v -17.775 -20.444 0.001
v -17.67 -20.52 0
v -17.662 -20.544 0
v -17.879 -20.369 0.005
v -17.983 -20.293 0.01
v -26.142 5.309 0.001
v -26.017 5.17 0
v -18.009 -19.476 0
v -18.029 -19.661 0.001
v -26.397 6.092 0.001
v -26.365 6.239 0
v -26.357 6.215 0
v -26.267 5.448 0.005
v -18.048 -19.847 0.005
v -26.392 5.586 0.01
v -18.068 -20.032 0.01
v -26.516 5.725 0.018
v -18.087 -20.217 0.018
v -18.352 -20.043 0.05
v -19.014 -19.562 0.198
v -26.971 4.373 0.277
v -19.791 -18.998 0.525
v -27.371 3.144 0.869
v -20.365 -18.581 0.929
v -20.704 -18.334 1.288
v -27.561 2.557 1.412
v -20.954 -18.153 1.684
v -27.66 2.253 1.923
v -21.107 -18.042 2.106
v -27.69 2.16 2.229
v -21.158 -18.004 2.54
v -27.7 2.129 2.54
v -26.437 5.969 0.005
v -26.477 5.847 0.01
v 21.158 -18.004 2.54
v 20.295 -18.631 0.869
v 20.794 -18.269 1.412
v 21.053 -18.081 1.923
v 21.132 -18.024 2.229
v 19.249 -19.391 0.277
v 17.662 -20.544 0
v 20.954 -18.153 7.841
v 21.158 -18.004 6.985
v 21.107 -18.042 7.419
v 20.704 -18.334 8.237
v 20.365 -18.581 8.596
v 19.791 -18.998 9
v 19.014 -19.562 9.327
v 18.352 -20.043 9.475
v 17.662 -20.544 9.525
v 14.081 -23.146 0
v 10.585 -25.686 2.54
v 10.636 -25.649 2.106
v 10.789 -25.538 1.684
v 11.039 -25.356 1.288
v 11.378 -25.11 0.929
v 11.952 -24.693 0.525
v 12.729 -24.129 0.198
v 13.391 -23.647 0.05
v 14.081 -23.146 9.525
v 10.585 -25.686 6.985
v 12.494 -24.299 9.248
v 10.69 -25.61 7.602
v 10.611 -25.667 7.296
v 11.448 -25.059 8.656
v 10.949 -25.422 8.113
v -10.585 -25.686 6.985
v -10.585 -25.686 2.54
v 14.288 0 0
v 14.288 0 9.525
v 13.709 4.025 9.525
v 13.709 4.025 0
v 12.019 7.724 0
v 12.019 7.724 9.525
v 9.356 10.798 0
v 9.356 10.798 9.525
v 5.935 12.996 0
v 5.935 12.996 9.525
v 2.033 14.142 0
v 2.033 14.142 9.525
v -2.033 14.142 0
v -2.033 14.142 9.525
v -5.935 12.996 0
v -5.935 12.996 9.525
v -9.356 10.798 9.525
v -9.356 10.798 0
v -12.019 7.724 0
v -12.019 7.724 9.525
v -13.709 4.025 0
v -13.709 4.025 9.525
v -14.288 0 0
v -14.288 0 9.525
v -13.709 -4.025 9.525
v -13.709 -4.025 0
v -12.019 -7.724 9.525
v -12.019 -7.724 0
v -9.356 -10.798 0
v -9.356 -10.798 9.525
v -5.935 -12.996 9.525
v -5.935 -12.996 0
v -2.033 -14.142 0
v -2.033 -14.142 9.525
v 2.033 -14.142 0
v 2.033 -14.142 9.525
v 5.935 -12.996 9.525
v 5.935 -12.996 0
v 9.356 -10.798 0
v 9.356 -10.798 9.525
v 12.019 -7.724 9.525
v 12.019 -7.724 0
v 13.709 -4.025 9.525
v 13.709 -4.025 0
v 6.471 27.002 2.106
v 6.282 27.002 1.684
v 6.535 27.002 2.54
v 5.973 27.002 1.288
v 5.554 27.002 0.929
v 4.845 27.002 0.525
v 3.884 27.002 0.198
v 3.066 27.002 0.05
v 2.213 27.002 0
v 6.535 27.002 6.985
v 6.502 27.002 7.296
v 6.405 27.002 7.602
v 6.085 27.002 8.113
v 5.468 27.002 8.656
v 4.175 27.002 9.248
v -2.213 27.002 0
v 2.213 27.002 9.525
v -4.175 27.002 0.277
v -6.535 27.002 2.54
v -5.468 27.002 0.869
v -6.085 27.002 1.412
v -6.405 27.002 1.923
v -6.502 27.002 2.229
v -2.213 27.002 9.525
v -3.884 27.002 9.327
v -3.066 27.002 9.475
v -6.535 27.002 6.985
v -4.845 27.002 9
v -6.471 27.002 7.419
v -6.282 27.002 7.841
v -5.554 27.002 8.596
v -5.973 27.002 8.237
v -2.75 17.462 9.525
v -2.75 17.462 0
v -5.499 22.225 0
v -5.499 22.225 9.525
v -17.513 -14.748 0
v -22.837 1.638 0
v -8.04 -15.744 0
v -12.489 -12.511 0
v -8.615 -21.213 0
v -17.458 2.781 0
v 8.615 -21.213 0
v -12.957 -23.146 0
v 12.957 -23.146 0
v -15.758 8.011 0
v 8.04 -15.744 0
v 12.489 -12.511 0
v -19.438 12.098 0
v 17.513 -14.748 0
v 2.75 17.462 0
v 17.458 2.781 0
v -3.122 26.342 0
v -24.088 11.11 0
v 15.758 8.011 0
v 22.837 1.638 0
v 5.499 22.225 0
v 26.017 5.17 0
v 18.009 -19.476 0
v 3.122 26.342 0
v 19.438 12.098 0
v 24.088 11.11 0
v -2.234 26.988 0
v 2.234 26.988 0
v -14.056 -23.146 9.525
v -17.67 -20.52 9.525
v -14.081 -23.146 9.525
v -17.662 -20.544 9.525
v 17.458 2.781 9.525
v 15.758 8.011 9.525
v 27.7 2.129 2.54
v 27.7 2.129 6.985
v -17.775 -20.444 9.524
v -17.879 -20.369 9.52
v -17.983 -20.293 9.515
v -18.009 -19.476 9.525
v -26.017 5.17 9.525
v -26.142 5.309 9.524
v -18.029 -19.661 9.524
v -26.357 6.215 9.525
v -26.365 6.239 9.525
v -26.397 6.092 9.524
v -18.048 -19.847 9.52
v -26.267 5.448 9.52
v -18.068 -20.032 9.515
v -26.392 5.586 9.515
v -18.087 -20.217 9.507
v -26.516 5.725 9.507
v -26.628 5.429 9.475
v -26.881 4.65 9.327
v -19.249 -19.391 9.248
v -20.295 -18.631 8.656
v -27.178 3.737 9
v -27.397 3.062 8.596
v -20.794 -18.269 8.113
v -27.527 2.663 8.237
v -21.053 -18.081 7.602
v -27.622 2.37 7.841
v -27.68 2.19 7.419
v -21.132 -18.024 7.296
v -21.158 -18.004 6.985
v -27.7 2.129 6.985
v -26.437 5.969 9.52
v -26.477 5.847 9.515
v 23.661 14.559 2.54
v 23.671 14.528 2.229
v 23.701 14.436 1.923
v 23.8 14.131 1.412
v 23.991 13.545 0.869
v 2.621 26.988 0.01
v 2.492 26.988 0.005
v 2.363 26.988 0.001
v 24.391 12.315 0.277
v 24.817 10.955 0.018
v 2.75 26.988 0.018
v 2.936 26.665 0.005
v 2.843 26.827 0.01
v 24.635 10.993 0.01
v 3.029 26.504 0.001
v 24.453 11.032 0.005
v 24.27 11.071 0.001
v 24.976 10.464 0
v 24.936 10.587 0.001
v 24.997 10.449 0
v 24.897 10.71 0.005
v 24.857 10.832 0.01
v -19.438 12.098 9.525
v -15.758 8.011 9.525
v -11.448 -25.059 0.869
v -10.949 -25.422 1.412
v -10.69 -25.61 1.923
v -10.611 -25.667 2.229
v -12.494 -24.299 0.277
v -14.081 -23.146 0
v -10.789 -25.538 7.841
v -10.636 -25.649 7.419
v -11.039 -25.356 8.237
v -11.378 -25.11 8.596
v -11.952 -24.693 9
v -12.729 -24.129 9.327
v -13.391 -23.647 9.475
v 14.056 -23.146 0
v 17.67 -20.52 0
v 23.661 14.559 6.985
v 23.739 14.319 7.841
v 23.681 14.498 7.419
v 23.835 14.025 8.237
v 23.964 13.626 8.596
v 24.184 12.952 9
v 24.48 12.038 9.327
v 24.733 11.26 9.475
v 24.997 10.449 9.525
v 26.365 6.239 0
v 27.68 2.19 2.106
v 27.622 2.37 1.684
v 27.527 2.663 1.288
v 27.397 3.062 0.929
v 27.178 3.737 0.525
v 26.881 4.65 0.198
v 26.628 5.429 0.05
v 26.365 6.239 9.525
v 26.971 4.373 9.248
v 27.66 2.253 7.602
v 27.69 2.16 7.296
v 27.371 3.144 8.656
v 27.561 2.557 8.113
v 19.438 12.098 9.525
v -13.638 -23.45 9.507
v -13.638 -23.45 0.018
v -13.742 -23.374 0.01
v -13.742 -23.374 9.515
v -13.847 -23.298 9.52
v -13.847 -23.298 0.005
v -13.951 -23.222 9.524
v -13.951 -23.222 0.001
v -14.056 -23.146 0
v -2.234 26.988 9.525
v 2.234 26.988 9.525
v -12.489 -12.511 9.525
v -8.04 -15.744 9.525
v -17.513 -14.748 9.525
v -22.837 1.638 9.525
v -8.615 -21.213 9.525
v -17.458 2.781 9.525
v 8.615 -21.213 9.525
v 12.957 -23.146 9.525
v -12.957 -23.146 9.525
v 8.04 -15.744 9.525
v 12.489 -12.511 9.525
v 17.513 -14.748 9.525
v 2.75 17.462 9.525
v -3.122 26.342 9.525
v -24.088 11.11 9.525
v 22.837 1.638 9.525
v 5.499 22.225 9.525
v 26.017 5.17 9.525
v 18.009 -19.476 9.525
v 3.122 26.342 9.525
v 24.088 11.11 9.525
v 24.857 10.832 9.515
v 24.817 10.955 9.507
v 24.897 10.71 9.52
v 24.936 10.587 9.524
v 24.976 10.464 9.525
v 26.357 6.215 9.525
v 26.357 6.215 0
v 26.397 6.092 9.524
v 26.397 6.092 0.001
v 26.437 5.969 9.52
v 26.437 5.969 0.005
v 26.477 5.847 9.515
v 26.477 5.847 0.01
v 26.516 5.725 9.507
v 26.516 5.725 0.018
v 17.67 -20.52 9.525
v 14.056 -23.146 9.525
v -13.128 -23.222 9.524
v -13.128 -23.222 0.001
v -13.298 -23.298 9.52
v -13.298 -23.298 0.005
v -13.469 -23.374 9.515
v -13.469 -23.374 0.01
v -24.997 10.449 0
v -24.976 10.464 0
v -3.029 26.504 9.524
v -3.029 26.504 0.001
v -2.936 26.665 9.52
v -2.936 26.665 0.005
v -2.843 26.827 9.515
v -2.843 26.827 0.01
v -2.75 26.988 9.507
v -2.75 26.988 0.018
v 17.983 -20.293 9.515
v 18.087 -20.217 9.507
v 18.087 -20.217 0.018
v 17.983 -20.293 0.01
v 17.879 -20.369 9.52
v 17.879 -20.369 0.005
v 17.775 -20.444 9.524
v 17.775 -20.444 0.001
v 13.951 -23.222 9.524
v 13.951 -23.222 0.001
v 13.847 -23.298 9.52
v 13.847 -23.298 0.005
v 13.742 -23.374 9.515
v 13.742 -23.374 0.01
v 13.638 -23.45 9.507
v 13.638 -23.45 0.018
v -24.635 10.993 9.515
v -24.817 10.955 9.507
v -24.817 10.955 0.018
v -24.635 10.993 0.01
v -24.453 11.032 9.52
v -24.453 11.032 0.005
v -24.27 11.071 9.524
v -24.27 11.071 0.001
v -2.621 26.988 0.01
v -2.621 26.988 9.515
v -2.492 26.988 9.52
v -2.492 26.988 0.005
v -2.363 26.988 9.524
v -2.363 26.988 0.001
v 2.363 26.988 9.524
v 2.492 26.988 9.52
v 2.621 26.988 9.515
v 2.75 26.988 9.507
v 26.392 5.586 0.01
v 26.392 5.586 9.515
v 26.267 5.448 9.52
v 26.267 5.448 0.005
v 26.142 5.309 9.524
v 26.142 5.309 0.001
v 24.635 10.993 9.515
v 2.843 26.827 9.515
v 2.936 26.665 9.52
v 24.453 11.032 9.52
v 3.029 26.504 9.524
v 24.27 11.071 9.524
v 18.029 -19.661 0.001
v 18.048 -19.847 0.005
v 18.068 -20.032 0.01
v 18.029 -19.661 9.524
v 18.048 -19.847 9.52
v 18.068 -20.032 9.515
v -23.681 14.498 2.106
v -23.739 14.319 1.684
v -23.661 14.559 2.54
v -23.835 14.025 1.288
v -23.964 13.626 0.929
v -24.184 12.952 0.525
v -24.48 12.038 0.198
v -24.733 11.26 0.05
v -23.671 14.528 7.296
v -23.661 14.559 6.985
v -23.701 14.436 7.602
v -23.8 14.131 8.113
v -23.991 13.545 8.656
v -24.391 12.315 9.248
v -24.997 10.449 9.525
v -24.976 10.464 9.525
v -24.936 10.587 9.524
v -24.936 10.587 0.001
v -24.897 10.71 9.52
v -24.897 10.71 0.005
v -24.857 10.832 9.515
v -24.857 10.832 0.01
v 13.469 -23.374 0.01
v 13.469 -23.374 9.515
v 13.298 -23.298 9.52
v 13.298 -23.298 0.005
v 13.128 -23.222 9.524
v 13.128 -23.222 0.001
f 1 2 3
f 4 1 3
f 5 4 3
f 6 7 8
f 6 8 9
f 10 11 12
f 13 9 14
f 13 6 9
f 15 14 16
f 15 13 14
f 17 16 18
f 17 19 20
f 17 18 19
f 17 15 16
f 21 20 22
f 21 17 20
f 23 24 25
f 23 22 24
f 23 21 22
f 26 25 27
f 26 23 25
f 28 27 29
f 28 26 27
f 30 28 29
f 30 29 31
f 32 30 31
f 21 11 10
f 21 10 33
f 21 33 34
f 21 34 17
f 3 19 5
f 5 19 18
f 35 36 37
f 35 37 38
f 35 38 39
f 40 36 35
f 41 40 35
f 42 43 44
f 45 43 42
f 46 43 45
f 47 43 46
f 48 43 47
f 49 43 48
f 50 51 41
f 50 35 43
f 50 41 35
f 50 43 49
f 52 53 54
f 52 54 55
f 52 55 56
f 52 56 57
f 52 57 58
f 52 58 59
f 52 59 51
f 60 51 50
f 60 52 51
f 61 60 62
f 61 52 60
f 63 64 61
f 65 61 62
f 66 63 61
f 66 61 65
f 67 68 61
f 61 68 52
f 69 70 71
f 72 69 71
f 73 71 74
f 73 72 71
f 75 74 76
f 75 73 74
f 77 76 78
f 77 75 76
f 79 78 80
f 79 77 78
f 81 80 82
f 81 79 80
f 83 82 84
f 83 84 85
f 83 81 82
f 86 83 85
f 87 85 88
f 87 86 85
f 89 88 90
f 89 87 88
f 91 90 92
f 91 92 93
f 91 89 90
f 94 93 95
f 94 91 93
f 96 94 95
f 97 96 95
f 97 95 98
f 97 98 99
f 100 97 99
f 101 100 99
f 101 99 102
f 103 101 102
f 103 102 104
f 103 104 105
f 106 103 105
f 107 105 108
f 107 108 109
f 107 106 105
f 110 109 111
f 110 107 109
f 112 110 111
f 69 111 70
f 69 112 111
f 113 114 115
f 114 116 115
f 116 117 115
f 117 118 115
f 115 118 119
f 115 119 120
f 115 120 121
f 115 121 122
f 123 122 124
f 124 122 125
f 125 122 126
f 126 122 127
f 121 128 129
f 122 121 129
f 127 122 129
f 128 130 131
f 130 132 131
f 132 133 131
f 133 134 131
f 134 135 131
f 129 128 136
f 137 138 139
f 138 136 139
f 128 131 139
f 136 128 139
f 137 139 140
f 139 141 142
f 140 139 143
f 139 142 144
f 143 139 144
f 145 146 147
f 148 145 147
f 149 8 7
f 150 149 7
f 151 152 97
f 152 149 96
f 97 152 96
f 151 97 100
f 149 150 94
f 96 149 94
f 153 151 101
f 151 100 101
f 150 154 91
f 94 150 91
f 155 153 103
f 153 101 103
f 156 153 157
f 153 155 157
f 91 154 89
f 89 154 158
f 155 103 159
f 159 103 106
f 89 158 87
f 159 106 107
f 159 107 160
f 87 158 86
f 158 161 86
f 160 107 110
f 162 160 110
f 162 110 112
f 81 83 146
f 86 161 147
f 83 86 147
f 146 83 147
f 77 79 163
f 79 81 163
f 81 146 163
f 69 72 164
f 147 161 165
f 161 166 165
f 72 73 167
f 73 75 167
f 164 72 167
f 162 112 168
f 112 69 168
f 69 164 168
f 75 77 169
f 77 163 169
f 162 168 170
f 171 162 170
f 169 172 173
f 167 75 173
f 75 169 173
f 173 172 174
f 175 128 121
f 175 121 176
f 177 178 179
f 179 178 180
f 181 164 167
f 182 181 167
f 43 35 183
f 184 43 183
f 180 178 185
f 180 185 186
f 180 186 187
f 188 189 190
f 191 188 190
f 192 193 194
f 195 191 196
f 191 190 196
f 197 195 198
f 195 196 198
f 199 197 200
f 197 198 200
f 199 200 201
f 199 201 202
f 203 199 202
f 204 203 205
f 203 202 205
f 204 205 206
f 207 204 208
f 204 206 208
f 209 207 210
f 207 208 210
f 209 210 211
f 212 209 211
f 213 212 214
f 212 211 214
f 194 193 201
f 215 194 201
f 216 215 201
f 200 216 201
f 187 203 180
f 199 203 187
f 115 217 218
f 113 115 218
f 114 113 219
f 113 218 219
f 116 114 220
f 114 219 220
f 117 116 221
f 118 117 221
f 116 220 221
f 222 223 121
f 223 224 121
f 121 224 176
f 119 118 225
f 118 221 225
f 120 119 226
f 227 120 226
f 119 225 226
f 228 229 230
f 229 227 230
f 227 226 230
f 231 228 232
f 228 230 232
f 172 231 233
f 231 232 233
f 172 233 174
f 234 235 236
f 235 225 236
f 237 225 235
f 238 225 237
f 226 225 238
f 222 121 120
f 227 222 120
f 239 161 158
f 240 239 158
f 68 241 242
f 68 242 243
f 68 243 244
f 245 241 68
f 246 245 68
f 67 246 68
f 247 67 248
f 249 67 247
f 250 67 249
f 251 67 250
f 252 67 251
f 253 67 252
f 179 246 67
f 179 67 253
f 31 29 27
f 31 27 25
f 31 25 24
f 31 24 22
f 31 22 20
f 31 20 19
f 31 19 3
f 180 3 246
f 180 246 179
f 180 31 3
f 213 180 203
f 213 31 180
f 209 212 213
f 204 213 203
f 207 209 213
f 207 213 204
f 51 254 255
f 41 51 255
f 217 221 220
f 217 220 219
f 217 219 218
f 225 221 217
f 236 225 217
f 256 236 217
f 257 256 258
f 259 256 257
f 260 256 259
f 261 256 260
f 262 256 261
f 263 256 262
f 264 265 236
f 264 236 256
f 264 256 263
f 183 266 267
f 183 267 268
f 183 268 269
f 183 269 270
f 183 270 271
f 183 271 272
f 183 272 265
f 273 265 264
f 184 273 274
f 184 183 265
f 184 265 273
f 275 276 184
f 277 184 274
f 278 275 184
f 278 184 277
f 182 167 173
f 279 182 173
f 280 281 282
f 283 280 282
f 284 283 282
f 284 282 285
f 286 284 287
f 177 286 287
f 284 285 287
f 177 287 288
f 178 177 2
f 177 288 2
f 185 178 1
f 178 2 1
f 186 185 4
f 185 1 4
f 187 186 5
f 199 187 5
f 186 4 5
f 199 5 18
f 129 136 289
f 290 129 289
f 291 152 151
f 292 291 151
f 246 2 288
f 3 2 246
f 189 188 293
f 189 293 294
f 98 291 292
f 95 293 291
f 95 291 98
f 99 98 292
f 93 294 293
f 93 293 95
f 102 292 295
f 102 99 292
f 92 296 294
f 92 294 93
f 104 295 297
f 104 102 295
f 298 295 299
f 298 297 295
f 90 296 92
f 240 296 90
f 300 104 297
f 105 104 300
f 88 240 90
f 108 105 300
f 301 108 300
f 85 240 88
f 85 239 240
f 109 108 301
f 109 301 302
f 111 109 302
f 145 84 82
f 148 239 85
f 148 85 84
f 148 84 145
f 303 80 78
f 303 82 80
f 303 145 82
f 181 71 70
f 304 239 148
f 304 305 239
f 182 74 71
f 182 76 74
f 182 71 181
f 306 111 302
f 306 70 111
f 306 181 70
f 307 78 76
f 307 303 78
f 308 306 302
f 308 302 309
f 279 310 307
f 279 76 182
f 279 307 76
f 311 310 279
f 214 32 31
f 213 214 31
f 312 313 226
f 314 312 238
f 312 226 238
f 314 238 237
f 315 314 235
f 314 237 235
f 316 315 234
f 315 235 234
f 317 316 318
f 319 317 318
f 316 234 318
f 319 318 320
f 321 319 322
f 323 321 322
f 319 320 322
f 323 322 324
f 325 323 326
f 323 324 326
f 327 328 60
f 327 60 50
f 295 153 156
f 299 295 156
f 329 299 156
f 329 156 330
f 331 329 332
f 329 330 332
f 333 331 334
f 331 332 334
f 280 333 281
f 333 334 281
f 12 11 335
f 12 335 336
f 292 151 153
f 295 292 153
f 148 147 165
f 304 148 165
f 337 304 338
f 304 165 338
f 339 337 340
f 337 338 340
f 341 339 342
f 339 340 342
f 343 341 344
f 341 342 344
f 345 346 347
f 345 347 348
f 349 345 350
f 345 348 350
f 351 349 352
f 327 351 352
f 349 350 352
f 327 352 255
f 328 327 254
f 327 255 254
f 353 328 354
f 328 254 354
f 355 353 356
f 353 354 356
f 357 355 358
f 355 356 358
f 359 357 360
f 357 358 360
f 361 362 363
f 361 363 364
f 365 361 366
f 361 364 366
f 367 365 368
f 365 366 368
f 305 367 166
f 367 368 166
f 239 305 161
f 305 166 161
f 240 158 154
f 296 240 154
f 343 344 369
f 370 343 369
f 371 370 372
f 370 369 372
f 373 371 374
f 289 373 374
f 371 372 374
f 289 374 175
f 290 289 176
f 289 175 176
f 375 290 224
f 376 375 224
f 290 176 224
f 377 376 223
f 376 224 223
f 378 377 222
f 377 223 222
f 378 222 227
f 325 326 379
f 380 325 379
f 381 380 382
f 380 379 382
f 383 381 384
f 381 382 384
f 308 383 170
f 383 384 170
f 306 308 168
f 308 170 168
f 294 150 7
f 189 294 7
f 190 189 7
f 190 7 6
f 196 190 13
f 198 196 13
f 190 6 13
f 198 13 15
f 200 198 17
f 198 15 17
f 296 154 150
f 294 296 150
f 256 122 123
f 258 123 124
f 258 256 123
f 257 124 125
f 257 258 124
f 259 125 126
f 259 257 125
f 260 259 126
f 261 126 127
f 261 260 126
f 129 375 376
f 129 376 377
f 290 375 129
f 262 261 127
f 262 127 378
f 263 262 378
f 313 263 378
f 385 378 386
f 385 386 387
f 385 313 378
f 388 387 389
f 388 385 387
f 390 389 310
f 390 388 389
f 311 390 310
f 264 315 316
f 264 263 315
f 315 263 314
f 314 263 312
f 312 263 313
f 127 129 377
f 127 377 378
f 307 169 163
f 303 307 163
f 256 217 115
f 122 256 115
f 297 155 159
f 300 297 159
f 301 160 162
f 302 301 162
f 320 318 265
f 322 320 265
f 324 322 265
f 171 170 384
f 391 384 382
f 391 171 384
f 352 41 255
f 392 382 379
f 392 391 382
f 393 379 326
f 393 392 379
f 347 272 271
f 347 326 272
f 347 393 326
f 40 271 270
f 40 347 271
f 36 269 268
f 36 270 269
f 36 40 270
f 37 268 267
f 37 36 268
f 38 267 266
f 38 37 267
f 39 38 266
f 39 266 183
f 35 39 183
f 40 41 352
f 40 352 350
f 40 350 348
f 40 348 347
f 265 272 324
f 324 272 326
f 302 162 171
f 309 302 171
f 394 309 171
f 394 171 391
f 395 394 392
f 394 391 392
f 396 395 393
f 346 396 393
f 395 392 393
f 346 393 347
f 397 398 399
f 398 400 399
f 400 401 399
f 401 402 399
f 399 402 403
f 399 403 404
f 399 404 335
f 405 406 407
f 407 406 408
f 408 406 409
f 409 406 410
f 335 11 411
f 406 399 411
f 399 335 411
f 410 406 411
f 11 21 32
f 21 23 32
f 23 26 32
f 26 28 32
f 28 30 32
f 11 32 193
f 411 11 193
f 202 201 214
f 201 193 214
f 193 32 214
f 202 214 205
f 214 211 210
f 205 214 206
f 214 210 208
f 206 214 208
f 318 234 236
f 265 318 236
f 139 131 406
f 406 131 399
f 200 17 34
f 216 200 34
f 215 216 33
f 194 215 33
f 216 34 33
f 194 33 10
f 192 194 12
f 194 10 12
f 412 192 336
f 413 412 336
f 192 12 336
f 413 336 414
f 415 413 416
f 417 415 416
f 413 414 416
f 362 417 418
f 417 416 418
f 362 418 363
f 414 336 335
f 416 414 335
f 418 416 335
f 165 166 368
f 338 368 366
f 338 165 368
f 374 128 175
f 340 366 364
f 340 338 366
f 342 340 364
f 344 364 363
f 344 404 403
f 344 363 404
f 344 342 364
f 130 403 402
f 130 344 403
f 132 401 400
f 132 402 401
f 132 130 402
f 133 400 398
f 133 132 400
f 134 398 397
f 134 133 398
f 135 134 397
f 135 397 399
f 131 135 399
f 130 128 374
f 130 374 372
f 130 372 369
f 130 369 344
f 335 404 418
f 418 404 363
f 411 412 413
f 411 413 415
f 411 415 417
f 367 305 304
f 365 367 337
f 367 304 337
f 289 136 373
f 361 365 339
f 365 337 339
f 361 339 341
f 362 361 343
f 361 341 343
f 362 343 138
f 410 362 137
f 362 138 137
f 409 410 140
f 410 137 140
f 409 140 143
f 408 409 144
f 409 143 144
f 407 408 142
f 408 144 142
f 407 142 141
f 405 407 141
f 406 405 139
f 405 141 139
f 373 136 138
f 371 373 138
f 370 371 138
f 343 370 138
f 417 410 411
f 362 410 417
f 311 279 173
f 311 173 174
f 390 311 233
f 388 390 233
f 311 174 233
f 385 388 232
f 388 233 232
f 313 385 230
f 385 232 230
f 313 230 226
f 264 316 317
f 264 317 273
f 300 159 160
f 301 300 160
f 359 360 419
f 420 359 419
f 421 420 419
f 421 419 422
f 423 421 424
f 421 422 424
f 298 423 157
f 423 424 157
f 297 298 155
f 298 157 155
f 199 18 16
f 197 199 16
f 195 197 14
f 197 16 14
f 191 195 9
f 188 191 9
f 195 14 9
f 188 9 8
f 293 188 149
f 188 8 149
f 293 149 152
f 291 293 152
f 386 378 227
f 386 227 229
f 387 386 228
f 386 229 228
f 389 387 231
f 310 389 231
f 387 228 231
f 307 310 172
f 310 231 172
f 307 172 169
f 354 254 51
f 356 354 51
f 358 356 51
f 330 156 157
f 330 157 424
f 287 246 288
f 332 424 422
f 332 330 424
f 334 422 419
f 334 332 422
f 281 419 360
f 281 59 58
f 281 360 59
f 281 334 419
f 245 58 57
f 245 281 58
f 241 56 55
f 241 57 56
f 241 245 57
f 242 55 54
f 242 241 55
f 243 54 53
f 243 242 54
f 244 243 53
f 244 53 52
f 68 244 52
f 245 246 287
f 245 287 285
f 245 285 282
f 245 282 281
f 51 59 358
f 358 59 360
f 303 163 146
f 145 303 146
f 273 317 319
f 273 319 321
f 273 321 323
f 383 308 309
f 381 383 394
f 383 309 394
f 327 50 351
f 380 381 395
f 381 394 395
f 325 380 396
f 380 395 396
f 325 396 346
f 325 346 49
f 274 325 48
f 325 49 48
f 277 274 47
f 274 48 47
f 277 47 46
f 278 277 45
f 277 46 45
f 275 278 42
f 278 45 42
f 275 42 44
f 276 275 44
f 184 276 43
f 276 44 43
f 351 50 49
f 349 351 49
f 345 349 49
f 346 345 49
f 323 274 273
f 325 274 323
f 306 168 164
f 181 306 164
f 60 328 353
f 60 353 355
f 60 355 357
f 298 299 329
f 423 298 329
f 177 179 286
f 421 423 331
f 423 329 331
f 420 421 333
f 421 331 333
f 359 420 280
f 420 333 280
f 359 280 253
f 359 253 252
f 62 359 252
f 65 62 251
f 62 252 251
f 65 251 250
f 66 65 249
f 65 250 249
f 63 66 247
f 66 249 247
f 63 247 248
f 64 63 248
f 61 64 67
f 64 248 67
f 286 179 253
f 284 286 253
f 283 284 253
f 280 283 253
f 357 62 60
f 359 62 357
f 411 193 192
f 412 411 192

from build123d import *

# Parameters (mm, degrees)
F0_R        = 14.2875
F1_DEPTH    = 9.525
F2_SIZE     = 8.0772
F3_T1_DEPTH = 33.8699635206
F3_T3_DEPTH = 33.8699635206
F3_T5_DEPTH = 33.8699635206
F3_T7_DEPTH = 33.8699635206
F3_T9_DEPTH = 33.8699635206
F4_T1_DEPTH = 33.8699635206
F4_T3_DEPTH = 33.8699635206
F4_T5_DEPTH = 33.8699635206
F4_T7_DEPTH = 33.8699635206
F4_T9_DEPTH = 33.8699635206


# Not quite as in the source:
# - a fillet or chamfer that OpenCascade refuses, or shapes differently, is made with other operations: its cross-section is extruded or revolved along the edge and cut away or added


with BuildPart() as f1:
    # F0 (on Top) → F1 (new body)
    with BuildSketch(Plane.XY):
        Polygon((30.1960443924, 9.8112895714), (0, 31.75), (-30.1960443924, 9.8112895714), (-18.6621817603, -25.6862895714), (18.6621817603, -25.6862895714), align=None)
        Polygon((-18.087352426, -20.2171537862), (-17.5125230918, -14.7480180011), (-12.4886978979, -12.5112669148), (-8.0397020384, -15.7436516137), (-8.6145313726, -21.2127873989), (-13.6383565665, -23.4495384851), align=None, mode=Mode.SUBTRACT)
        Circle(F0_R, mode=Mode.SUBTRACT)
        Polygon((13.6383565665, -23.4495384851), (8.6145313726, -21.2127873989), (8.0397020384, -15.7436516137), (12.4886978979, -12.5112669148), (17.5125230918, -14.7480180011), (18.087352426, -20.2171537862), align=None, mode=Mode.SUBTRACT)
        Polygon((-24.8169551322, 10.9546502895), (-19.4378658721, 12.0980110075), (-15.7581418145, 8.011263418), (-17.4575070171, 2.7811551105), (-22.8365962772, 1.6377943925), (-26.5163203348, 5.7245419819), align=None, mode=Mode.SUBTRACT)
        Polygon((-5.499261314, 22.225), (-2.749630657, 26.9875), (2.749630657, 26.9875), (5.499261314, 22.225), (2.749630657, 17.4625), (-2.749630657, 17.4625), align=None, mode=Mode.SUBTRACT)
        Polygon((26.5163203348, 5.7245419819), (22.8365962772, 1.6377943925), (17.4575070171, 2.7811551105), (15.7581418145, 8.011263418), (19.4378658721, 12.0980110075), (24.8169551322, 10.9546502895), align=None, mode=Mode.SUBTRACT)
    extrude(amount=F1_DEPTH)

    # F2
    f2_edges = [f1.edges().sort_by_distance(p)[0] for p in [
        (-18.662182, -25.68629, 4.7625),
        (18.662182, -25.68629, 4.7625),
        (30.196044, 9.81129, 4.7625),
        (0, 31.75, 4.7625),
        (-30.196044, 9.81129, 4.7625),
    ]]
    chamfer(f2_edges, length=F2_SIZE)

    # F3: fillet of radius 2.54 on 5 edges, made by hand

    # F3_s2 → F3_t1 (cut)
    with BuildSketch(Plane(origin=(-5.2331971634, -16.1061247565, 0), x_dir=(0, 0, 1), z_dir=(0.3090169944, 0.9510565163, 0))):
        with BuildLine():
            ThreePointArc((9.525, 23.1462895714), (8.7810512242, 24.9423407956), (6.985, 25.6862895714))
            Line((6.985, 25.6862895714), (9.525, 25.6862895714))
            Line((9.525, 25.6862895714), (9.525, 23.1462895714))
        make_face()
    extrude(amount=F3_T1_DEPTH, mode=Mode.SUBTRACT)

    # F3_s4 → F3_t3 (cut)
    with BuildSketch(Plane.YZ.offset(-16.9349817603)):
        with BuildLine():
            ThreePointArc((-23.1462895714, 9.525), (-24.9423407956, 8.7810512242), (-25.6862895714, 6.985))
            Line((-25.6862895714, 6.985), (-25.6862895714, 9.525))
            Line((-25.6862895714, 9.525), (-23.1462895714, 9.525))
        make_face()
    extrude(amount=F3_T3_DEPTH, mode=Mode.SUBTRACT)

    # F3_s6 → F3_t5 (cut)
    with BuildSketch(Plane(origin=(-5.2331971634, 16.1061247565, 0), x_dir=(0, 0, 1), z_dir=(0.3090169944, -0.9510565163, 0))):
        with BuildLine():
            ThreePointArc((9.525, 23.1462895714), (8.7810512242, 24.9423407956), (6.985, 25.6862895714))
            Line((6.985, 25.6862895714), (9.525, 25.6862895714))
            Line((9.525, 25.6862895714), (9.525, 23.1462895714))
        make_face()
    extrude(amount=F3_T5_DEPTH, mode=Mode.SUBTRACT)

    # F3_s8 → F3_t7 (cut)
    with BuildSketch(Plane(origin=(13.7006880435, 9.9541325265, 0), x_dir=(0, 0, 1), z_dir=(-0.8090169944, -0.5877852523, 0))):
        with BuildLine():
            ThreePointArc((9.525, 23.1462895714), (8.7810512242, 24.9423407956), (6.985, 25.6862895714))
            Line((6.985, 25.6862895714), (9.525, 25.6862895714))
            Line((9.525, 25.6862895714), (9.525, 23.1462895714))
        make_face()
    extrude(amount=F3_T7_DEPTH, mode=Mode.SUBTRACT)

    # F3_s10 → F3_t9 (cut)
    with BuildSketch(Plane(origin=(13.7006880435, -9.9541325265, 0), x_dir=(0, 0, 1), z_dir=(-0.8090169944, 0.5877852523, 0))):
        with BuildLine():
            ThreePointArc((6.985, 25.6862895714), (8.7810512242, 24.9423407956), (9.525, 23.1462895714))
            Line((9.525, 23.1462895714), (9.525, 25.6862895714))
            Line((9.525, 25.6862895714), (6.985, 25.6862895714))
        make_face()
    extrude(amount=F3_T9_DEPTH, mode=Mode.SUBTRACT)

    # F4: fillet of radius 2.54 on 5 edges, made by hand

    # F4_s2 → F4_t1 (cut)
    with BuildSketch(Plane(origin=(-5.2331971634, -16.1061247565, 0), x_dir=(0, 0, 1), z_dir=(0.3090169944, 0.9510565163, 0))):
        with BuildLine():
            ThreePointArc((0, 23.1462895714), (0.7439487758, 24.9423407956), (2.54, 25.6862895714))
            Line((2.54, 25.6862895714), (0, 25.6862895714))
            Line((0, 25.6862895714), (0, 23.1462895714))
        make_face()
    extrude(amount=F4_T1_DEPTH, mode=Mode.SUBTRACT)

    # F4_s4 → F4_t3 (cut)
    with BuildSketch(Plane.YZ.offset(-16.9349817603)):
        with BuildLine():
            ThreePointArc((-23.1462895714, 0), (-24.9423407956, 0.7439487758), (-25.6862895714, 2.54))
            Line((-25.6862895714, 2.54), (-25.6862895714, 0))
            Line((-25.6862895714, 0), (-23.1462895714, 0))
        make_face()
    extrude(amount=F4_T3_DEPTH, mode=Mode.SUBTRACT)

    # F4_s6 → F4_t5 (cut)
    with BuildSketch(Plane(origin=(13.7006880435, 9.9541325265, 0), x_dir=(0, 0, 1), z_dir=(-0.8090169944, -0.5877852523, 0))):
        with BuildLine():
            ThreePointArc((0, 23.1462895714), (0.7439487758, 24.9423407956), (2.54, 25.6862895714))
            Line((2.54, 25.6862895714), (0, 25.6862895714))
            Line((0, 25.6862895714), (0, 23.1462895714))
        make_face()
    extrude(amount=F4_T5_DEPTH, mode=Mode.SUBTRACT)

    # F4_s8 → F4_t7 (cut)
    with BuildSketch(Plane(origin=(13.7006880435, -9.9541325265, 0), x_dir=(0, 0, 1), z_dir=(-0.8090169944, 0.5877852523, 0))):
        with BuildLine():
            ThreePointArc((2.54, 25.6862895714), (0.7439487758, 24.9423407956), (0, 23.1462895714))
            Line((0, 23.1462895714), (0, 25.6862895714))
            Line((0, 25.6862895714), (2.54, 25.6862895714))
        make_face()
    extrude(amount=F4_T7_DEPTH, mode=Mode.SUBTRACT)

    # F4_s10 → F4_t9 (cut)
    with BuildSketch(Plane(origin=(-5.2331971634, 16.1061247565, 0), x_dir=(0, 0, 1), z_dir=(0.3090169944, -0.9510565163, 0))):
        with BuildLine():
            ThreePointArc((0, 23.1462895714), (0.7439487758, 24.9423407956), (2.54, 25.6862895714))
            Line((2.54, 25.6862895714), (0, 25.6862895714))
            Line((0, 25.6862895714), (0, 23.1462895714))
        make_face()
    extrude(amount=F4_T9_DEPTH, mode=Mode.SUBTRACT)


solid = f1.part
